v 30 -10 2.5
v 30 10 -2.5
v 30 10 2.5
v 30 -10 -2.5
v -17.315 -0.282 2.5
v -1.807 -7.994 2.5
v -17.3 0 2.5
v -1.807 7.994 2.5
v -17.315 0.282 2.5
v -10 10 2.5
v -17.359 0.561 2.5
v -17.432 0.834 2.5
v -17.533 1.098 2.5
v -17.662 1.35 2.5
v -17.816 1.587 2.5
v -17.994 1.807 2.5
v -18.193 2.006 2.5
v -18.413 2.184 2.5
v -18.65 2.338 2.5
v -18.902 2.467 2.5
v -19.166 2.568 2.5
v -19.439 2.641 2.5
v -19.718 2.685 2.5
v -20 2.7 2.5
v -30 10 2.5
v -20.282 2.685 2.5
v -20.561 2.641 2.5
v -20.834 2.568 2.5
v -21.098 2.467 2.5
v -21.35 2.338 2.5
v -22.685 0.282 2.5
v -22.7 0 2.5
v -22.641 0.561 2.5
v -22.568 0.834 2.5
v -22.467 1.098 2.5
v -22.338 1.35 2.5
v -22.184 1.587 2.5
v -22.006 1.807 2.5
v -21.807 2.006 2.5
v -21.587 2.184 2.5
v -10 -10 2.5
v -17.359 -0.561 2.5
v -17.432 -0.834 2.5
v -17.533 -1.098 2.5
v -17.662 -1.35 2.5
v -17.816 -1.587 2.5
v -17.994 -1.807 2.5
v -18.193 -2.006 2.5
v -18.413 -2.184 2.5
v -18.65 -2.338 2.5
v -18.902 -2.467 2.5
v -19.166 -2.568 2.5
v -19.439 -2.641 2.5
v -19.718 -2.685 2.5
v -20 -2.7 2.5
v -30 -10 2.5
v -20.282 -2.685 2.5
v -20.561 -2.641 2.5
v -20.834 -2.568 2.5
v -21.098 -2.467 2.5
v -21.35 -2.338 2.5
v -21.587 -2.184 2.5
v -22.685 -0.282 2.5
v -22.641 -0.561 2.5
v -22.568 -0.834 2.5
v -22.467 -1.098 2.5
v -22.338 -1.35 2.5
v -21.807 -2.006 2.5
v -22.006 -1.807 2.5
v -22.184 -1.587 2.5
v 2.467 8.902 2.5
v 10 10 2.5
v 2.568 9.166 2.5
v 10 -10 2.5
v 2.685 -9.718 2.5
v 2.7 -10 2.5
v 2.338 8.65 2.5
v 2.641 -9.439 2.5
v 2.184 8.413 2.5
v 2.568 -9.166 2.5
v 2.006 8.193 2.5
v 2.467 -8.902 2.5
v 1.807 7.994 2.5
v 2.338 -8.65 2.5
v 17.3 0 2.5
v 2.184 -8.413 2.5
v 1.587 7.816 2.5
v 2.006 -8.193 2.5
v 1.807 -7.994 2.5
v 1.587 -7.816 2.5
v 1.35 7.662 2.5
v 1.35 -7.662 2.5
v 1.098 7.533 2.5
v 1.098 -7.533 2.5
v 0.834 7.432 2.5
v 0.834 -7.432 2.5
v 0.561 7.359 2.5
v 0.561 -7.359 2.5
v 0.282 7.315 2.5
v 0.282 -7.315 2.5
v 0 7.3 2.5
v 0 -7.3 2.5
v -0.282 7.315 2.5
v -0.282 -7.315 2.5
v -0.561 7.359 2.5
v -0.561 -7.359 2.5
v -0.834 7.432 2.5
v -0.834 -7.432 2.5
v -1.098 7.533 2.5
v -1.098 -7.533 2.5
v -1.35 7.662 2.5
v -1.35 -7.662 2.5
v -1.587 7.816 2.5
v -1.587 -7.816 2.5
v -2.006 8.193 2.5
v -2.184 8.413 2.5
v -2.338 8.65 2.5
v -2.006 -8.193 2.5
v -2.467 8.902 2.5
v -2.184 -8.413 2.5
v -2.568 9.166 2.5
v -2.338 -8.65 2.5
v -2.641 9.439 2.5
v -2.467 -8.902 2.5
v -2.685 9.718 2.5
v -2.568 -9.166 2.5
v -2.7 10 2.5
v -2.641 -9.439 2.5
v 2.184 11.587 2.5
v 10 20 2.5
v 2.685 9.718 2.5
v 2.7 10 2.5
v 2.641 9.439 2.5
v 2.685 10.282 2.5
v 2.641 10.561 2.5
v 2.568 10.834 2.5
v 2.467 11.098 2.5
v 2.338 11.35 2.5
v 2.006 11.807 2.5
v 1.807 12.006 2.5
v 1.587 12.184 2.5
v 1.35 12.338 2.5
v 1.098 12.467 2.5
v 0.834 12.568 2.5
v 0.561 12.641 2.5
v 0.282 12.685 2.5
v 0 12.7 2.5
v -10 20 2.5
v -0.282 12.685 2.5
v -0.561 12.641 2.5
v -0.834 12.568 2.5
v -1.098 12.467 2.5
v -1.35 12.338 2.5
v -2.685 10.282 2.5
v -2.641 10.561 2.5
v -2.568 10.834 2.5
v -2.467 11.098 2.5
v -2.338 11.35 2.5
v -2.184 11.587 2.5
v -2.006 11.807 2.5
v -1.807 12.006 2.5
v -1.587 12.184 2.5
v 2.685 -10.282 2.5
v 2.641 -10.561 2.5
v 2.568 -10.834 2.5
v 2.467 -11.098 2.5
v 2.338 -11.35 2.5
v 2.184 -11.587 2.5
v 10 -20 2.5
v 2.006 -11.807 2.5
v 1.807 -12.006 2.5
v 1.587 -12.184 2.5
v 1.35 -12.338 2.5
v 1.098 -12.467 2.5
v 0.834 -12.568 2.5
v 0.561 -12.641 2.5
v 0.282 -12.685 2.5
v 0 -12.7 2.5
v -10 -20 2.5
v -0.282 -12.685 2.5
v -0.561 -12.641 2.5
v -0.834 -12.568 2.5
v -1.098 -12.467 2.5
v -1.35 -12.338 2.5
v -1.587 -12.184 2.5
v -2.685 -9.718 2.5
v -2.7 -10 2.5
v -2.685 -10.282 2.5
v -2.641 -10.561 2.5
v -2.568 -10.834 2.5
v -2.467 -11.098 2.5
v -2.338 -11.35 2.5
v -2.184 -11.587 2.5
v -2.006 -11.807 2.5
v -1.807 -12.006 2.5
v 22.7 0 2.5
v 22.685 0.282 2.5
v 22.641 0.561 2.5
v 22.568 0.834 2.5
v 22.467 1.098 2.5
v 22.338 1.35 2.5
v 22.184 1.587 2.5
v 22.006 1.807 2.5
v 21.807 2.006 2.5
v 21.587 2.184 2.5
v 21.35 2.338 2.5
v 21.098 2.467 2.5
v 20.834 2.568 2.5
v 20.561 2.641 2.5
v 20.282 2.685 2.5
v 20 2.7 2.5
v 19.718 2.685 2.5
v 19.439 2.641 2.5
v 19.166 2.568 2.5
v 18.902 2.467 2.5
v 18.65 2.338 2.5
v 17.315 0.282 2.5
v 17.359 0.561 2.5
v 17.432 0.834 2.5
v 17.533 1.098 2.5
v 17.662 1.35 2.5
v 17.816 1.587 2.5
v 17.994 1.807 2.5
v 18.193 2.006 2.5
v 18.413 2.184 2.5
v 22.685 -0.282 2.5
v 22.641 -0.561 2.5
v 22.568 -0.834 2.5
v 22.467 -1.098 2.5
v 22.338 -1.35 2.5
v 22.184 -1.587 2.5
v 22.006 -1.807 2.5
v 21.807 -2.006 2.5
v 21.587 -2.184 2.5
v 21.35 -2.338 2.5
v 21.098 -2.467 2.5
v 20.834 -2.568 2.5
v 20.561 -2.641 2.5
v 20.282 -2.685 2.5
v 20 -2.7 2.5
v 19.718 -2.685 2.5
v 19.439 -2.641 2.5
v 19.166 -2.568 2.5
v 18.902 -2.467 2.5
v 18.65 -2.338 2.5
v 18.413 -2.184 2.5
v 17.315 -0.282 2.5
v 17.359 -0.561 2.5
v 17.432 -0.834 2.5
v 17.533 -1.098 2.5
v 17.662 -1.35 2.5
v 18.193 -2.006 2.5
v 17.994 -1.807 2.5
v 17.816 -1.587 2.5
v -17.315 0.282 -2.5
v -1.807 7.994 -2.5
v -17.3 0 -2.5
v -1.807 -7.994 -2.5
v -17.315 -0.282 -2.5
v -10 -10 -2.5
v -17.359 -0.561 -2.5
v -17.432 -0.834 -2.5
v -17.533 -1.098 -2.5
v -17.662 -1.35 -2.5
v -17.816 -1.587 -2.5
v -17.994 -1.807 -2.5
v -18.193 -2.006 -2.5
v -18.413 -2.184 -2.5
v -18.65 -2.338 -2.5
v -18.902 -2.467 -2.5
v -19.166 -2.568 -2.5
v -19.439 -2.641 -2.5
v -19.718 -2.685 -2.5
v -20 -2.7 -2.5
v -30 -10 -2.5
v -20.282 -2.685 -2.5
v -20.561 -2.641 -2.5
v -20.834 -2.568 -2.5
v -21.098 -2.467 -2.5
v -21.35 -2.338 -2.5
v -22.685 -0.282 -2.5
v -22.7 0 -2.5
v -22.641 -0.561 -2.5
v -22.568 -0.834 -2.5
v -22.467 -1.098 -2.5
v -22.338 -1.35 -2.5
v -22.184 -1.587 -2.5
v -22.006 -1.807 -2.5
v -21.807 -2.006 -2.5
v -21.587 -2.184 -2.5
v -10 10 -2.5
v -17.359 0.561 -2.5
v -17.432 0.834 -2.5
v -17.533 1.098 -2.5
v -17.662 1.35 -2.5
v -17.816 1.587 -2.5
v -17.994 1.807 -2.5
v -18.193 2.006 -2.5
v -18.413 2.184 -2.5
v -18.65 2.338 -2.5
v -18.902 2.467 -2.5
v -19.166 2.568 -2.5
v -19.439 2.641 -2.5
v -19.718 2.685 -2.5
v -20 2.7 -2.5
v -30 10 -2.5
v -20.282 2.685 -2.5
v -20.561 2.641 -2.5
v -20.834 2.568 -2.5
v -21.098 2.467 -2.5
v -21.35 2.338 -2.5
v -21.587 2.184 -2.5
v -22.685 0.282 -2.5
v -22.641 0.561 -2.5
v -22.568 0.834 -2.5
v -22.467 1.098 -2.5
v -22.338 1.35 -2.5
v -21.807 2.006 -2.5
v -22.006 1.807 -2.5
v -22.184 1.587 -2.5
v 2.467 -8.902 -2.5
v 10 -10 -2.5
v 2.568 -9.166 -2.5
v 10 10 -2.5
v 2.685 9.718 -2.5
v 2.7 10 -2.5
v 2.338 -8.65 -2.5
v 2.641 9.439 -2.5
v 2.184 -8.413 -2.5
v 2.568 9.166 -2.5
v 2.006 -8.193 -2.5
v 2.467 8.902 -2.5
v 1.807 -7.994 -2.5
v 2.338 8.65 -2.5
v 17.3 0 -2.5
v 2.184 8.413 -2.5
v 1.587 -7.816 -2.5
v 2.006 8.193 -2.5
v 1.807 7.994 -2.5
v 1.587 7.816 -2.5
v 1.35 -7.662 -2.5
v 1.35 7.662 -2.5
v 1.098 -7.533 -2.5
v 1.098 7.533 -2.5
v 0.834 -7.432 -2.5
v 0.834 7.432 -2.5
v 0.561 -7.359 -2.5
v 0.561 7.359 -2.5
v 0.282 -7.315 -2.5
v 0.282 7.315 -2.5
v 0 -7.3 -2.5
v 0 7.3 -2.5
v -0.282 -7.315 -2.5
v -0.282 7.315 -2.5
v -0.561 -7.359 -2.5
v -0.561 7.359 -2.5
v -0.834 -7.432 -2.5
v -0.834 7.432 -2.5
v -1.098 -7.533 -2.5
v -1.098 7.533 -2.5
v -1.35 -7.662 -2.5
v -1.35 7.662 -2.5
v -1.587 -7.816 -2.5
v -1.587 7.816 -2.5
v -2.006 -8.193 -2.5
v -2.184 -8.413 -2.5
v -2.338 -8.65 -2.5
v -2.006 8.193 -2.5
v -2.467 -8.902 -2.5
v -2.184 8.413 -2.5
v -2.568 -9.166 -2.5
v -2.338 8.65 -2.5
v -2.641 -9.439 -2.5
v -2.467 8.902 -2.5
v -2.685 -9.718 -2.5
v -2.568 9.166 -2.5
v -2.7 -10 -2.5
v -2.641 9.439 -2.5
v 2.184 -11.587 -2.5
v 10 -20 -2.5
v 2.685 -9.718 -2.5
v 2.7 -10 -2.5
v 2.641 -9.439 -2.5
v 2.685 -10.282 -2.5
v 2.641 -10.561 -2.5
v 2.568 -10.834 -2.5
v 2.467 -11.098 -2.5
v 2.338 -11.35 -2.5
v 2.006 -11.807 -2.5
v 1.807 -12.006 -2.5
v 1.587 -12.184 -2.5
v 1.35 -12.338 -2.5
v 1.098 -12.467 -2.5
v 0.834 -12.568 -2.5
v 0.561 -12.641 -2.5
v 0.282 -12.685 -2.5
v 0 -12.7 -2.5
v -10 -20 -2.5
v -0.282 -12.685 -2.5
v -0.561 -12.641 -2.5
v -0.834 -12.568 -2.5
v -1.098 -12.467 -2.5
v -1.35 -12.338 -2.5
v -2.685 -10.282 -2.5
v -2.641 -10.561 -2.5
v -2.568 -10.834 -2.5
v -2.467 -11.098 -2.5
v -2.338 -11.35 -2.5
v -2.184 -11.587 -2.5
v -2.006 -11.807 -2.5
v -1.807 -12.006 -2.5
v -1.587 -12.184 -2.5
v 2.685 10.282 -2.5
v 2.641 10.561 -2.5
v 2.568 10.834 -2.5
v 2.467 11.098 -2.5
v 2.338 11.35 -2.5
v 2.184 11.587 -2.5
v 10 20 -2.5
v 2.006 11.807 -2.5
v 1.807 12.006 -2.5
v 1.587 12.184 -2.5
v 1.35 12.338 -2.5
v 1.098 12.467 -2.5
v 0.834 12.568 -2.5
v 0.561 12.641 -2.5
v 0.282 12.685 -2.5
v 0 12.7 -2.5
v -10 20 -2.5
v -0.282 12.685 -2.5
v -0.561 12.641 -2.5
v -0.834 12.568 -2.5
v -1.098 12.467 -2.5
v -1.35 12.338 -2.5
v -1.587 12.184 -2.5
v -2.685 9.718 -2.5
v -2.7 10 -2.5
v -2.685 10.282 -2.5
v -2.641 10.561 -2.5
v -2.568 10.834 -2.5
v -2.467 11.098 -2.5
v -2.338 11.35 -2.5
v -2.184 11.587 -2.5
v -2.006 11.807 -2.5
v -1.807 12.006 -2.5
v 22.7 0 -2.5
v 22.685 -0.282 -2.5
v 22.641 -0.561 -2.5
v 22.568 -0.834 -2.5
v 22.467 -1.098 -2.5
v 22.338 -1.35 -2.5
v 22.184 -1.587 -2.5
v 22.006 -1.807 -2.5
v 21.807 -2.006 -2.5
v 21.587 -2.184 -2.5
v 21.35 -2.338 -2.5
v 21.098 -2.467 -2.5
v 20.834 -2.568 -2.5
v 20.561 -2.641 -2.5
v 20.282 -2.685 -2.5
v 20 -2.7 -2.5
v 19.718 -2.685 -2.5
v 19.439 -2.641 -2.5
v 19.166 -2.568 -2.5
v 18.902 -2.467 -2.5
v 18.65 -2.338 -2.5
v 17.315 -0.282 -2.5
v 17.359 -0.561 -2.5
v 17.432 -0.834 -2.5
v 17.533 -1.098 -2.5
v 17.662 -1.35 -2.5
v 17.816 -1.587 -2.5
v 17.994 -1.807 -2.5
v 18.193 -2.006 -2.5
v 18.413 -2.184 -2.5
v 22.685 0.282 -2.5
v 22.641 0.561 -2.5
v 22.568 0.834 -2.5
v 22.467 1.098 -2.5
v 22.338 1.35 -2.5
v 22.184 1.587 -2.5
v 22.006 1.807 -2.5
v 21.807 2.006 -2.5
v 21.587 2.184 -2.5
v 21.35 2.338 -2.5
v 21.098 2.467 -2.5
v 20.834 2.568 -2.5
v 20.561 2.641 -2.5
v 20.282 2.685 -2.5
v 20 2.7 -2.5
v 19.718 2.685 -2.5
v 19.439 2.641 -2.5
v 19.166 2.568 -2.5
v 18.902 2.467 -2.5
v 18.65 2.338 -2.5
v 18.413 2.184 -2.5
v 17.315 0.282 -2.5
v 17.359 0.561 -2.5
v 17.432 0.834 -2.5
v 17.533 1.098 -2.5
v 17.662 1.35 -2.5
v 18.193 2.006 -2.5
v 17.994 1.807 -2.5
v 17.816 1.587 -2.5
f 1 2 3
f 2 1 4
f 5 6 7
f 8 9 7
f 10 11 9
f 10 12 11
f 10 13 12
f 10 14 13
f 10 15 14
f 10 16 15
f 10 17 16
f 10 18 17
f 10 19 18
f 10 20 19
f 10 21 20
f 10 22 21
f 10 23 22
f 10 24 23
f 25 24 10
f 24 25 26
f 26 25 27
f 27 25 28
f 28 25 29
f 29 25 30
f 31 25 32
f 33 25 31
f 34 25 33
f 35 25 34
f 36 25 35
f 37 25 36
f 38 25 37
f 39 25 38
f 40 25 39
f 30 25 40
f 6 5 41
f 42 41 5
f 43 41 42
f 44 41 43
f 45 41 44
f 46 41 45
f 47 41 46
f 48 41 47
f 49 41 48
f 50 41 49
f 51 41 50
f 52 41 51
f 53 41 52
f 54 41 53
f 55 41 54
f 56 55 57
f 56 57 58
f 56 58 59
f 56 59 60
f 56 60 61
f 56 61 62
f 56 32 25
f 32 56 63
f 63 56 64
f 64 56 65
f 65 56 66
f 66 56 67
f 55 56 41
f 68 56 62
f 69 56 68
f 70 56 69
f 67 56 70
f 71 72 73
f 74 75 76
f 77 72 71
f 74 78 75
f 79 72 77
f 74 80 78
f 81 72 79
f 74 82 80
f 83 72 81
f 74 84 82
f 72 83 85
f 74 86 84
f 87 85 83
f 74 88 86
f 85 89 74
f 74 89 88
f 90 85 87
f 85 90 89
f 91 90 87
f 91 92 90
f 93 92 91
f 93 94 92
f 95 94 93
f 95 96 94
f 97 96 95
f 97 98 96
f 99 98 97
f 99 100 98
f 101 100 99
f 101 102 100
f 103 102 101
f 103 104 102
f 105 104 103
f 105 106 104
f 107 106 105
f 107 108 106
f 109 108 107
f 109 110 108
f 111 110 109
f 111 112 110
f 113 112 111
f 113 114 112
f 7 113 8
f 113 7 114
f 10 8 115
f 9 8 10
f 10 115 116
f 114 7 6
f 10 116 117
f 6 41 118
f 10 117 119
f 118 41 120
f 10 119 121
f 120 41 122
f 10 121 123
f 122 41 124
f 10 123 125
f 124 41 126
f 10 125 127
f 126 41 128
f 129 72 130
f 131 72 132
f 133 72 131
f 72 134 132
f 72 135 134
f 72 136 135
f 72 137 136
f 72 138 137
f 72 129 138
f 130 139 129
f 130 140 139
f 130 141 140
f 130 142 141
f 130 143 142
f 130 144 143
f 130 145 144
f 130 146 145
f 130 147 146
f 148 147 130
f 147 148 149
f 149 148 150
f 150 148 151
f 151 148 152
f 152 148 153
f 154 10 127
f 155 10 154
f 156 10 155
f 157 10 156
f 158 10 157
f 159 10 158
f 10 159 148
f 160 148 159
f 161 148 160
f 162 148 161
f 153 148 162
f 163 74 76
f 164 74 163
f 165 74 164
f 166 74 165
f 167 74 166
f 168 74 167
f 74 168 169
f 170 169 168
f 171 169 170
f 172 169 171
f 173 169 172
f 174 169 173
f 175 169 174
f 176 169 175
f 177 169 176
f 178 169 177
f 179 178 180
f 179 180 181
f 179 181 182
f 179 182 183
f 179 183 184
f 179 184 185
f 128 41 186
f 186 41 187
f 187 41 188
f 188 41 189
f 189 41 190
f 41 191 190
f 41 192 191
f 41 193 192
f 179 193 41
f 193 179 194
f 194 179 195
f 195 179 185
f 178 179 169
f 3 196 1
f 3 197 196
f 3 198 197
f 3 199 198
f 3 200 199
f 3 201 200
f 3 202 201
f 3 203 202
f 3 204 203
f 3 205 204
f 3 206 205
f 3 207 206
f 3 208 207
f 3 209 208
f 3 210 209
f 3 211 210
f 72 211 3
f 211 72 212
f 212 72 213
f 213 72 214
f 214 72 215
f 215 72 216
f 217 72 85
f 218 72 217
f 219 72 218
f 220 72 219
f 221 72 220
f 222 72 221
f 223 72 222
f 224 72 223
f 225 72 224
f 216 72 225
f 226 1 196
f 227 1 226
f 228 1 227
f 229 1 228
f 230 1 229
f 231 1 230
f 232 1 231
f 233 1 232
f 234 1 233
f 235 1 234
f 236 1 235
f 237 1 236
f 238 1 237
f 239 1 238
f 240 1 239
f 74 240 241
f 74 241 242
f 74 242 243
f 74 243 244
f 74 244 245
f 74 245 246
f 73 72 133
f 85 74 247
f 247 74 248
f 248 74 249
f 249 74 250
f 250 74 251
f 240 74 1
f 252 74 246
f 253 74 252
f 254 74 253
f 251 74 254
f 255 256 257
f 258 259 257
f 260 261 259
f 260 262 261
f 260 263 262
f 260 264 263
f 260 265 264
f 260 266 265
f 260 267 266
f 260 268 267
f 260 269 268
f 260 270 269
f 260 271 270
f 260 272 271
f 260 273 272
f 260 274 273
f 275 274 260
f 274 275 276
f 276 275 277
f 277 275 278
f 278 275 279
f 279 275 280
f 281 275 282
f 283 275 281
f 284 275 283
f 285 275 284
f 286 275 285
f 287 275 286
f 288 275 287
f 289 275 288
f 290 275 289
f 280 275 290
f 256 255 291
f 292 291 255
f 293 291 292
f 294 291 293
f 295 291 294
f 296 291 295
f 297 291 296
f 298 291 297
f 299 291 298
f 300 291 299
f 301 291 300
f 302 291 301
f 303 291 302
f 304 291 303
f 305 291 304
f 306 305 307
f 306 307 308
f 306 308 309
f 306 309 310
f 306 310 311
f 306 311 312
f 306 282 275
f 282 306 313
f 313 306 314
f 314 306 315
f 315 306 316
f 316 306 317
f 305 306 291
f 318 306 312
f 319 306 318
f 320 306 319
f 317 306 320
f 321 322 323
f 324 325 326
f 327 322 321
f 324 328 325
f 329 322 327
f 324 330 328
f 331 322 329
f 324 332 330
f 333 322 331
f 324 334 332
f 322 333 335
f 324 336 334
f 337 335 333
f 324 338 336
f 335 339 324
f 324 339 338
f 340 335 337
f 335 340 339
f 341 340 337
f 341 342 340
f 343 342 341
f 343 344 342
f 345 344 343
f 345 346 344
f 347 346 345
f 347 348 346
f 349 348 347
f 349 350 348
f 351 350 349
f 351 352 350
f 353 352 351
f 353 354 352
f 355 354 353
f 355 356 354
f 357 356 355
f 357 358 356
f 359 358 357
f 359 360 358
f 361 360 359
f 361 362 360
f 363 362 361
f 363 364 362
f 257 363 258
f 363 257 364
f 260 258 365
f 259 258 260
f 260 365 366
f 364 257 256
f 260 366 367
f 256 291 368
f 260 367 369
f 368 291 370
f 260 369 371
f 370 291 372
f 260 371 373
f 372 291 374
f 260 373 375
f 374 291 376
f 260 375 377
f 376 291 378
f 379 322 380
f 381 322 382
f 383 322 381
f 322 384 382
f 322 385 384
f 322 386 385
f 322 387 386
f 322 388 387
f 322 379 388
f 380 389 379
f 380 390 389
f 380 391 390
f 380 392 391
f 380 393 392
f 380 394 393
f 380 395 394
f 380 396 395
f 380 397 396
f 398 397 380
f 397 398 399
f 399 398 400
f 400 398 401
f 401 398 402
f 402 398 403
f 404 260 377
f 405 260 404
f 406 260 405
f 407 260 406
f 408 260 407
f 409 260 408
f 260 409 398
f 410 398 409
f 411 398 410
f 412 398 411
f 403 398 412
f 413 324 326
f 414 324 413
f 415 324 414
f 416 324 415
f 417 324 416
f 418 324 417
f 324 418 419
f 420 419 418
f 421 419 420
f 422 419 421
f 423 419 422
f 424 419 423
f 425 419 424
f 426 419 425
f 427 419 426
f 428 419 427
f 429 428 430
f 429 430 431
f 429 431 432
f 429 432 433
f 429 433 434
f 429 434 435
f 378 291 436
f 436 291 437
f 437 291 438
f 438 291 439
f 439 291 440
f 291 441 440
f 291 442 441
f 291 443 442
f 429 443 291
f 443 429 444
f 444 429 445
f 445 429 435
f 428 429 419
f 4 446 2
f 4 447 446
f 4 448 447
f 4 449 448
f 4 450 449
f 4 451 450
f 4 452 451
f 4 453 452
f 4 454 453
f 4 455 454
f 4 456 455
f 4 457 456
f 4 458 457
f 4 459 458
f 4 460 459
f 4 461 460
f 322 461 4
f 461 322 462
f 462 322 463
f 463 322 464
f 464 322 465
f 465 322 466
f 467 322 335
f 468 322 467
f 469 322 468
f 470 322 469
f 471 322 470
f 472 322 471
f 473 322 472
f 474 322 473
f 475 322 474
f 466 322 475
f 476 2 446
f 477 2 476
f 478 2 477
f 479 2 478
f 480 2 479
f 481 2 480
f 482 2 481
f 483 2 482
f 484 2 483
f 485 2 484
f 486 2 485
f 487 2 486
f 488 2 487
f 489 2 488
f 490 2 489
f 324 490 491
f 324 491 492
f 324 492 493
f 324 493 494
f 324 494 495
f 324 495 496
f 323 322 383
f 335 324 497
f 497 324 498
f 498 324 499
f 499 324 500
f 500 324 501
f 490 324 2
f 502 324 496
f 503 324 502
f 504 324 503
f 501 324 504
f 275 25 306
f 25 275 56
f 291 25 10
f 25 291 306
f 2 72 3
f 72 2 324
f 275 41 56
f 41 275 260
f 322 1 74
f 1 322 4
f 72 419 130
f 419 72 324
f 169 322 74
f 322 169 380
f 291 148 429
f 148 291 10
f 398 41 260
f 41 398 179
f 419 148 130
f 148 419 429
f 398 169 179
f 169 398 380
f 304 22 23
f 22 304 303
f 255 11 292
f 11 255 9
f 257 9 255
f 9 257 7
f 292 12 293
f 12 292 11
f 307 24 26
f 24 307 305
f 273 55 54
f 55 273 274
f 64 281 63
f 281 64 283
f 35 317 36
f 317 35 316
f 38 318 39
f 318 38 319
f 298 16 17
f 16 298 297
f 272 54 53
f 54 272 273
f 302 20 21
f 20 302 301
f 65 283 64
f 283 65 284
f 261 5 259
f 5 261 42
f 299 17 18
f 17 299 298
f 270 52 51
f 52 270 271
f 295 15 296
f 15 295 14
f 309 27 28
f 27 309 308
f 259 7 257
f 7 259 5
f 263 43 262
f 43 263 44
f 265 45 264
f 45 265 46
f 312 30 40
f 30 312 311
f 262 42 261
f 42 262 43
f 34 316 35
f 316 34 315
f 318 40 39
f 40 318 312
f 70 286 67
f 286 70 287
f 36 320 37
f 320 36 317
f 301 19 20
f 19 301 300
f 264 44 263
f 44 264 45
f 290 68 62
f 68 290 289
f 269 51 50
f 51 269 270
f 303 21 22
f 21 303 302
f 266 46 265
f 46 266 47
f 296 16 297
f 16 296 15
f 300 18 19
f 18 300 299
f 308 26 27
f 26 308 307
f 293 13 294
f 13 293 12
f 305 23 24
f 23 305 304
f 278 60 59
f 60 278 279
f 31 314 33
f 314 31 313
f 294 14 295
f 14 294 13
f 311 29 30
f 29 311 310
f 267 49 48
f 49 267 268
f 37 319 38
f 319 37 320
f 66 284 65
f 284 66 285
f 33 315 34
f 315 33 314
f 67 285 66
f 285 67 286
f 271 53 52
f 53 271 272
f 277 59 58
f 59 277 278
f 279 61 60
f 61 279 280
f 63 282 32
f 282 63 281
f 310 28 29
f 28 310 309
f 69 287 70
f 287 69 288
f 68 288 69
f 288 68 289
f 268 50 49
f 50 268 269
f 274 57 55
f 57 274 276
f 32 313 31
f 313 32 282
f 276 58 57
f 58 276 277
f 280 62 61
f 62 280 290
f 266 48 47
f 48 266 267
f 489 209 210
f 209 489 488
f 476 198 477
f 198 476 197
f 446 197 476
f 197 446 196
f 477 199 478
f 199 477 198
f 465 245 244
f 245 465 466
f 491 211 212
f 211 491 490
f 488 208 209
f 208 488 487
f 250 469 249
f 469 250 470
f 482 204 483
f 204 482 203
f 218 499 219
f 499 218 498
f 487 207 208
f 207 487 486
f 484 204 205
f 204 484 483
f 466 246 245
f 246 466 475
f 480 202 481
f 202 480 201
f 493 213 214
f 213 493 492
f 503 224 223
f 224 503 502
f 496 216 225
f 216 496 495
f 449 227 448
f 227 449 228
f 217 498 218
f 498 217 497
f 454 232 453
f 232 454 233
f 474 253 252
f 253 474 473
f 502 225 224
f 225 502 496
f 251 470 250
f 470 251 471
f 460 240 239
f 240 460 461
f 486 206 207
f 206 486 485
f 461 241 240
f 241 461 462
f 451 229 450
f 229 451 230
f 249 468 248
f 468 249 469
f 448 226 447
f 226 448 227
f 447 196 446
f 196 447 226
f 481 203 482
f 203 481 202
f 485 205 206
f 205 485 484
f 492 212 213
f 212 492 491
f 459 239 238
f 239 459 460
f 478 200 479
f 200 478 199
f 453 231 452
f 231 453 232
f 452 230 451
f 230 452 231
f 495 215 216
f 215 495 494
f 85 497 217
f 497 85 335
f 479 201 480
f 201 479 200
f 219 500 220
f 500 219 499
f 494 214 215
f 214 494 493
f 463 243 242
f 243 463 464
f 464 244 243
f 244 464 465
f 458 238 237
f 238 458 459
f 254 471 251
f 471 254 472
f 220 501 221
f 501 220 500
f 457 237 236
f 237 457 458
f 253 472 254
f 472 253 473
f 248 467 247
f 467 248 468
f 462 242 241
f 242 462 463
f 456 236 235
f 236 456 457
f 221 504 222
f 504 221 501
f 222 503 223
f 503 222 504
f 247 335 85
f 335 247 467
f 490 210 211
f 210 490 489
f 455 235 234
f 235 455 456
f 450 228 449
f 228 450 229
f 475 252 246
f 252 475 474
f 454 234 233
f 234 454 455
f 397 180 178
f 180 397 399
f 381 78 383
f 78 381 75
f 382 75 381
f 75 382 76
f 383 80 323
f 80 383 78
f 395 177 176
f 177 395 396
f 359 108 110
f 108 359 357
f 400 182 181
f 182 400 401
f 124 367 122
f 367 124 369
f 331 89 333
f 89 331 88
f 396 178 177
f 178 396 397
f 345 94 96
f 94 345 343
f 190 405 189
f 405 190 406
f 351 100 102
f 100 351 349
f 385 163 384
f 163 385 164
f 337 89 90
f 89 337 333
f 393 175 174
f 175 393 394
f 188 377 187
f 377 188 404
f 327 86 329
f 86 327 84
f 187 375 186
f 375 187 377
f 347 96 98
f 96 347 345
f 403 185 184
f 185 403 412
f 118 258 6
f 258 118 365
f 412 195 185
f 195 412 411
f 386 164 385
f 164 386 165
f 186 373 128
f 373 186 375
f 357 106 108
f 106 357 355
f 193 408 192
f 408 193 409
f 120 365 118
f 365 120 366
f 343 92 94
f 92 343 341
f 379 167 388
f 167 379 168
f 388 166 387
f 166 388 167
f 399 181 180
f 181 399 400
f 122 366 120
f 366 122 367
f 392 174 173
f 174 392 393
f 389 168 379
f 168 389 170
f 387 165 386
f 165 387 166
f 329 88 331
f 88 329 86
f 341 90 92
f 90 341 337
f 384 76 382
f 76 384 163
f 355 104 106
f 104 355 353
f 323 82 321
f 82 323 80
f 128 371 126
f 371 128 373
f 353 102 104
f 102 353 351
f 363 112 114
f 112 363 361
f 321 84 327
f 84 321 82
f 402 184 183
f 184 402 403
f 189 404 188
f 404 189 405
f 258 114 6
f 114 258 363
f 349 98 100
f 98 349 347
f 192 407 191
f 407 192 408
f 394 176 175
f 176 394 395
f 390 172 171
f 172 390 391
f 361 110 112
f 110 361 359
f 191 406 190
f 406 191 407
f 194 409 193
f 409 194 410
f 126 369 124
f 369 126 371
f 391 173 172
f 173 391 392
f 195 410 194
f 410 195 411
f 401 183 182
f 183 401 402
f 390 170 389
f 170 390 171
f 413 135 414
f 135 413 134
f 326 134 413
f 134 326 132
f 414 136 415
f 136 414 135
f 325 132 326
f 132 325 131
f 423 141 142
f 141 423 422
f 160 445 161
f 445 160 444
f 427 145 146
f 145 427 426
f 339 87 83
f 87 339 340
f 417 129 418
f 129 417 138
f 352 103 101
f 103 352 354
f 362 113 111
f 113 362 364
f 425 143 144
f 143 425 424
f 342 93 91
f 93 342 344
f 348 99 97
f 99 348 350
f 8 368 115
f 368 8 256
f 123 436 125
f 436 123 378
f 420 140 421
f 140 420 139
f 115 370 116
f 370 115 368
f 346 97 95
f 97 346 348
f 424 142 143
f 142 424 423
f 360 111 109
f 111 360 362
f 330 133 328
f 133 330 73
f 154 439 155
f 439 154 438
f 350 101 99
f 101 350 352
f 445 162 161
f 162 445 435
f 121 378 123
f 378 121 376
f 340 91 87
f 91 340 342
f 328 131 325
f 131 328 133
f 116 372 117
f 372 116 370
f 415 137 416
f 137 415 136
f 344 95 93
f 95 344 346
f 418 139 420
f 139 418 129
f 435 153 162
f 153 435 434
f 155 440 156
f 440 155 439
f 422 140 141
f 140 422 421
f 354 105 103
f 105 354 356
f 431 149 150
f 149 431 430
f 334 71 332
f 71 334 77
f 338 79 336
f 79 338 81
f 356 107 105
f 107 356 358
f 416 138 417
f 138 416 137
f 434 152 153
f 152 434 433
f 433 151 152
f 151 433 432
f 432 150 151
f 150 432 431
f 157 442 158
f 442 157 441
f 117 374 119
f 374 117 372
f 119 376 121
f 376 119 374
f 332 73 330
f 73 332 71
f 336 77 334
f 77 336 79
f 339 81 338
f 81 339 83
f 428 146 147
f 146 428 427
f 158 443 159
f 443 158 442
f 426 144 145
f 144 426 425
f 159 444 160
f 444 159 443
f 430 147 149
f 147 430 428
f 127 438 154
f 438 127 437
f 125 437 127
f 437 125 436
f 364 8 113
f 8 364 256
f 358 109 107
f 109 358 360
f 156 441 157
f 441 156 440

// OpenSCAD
// T-shaped mounting plate.
$fn = 60;
eps = 0.02;
stem_l = 60;
arm_l = 40;
width = 20;
thickness = 5;
difference() {
    union() { cube([stem_l,width,thickness],center=true); cube([width,arm_l,thickness],center=true); }
    for (p=[[-stem_l/2+10,0],[stem_l/2-10,0],[0,-arm_l/2+10],[0,arm_l/2-10]]) translate([p[0],p[1],-thickness/2-eps]) cylinder(d=5.4,h=thickness+2*eps);
}
